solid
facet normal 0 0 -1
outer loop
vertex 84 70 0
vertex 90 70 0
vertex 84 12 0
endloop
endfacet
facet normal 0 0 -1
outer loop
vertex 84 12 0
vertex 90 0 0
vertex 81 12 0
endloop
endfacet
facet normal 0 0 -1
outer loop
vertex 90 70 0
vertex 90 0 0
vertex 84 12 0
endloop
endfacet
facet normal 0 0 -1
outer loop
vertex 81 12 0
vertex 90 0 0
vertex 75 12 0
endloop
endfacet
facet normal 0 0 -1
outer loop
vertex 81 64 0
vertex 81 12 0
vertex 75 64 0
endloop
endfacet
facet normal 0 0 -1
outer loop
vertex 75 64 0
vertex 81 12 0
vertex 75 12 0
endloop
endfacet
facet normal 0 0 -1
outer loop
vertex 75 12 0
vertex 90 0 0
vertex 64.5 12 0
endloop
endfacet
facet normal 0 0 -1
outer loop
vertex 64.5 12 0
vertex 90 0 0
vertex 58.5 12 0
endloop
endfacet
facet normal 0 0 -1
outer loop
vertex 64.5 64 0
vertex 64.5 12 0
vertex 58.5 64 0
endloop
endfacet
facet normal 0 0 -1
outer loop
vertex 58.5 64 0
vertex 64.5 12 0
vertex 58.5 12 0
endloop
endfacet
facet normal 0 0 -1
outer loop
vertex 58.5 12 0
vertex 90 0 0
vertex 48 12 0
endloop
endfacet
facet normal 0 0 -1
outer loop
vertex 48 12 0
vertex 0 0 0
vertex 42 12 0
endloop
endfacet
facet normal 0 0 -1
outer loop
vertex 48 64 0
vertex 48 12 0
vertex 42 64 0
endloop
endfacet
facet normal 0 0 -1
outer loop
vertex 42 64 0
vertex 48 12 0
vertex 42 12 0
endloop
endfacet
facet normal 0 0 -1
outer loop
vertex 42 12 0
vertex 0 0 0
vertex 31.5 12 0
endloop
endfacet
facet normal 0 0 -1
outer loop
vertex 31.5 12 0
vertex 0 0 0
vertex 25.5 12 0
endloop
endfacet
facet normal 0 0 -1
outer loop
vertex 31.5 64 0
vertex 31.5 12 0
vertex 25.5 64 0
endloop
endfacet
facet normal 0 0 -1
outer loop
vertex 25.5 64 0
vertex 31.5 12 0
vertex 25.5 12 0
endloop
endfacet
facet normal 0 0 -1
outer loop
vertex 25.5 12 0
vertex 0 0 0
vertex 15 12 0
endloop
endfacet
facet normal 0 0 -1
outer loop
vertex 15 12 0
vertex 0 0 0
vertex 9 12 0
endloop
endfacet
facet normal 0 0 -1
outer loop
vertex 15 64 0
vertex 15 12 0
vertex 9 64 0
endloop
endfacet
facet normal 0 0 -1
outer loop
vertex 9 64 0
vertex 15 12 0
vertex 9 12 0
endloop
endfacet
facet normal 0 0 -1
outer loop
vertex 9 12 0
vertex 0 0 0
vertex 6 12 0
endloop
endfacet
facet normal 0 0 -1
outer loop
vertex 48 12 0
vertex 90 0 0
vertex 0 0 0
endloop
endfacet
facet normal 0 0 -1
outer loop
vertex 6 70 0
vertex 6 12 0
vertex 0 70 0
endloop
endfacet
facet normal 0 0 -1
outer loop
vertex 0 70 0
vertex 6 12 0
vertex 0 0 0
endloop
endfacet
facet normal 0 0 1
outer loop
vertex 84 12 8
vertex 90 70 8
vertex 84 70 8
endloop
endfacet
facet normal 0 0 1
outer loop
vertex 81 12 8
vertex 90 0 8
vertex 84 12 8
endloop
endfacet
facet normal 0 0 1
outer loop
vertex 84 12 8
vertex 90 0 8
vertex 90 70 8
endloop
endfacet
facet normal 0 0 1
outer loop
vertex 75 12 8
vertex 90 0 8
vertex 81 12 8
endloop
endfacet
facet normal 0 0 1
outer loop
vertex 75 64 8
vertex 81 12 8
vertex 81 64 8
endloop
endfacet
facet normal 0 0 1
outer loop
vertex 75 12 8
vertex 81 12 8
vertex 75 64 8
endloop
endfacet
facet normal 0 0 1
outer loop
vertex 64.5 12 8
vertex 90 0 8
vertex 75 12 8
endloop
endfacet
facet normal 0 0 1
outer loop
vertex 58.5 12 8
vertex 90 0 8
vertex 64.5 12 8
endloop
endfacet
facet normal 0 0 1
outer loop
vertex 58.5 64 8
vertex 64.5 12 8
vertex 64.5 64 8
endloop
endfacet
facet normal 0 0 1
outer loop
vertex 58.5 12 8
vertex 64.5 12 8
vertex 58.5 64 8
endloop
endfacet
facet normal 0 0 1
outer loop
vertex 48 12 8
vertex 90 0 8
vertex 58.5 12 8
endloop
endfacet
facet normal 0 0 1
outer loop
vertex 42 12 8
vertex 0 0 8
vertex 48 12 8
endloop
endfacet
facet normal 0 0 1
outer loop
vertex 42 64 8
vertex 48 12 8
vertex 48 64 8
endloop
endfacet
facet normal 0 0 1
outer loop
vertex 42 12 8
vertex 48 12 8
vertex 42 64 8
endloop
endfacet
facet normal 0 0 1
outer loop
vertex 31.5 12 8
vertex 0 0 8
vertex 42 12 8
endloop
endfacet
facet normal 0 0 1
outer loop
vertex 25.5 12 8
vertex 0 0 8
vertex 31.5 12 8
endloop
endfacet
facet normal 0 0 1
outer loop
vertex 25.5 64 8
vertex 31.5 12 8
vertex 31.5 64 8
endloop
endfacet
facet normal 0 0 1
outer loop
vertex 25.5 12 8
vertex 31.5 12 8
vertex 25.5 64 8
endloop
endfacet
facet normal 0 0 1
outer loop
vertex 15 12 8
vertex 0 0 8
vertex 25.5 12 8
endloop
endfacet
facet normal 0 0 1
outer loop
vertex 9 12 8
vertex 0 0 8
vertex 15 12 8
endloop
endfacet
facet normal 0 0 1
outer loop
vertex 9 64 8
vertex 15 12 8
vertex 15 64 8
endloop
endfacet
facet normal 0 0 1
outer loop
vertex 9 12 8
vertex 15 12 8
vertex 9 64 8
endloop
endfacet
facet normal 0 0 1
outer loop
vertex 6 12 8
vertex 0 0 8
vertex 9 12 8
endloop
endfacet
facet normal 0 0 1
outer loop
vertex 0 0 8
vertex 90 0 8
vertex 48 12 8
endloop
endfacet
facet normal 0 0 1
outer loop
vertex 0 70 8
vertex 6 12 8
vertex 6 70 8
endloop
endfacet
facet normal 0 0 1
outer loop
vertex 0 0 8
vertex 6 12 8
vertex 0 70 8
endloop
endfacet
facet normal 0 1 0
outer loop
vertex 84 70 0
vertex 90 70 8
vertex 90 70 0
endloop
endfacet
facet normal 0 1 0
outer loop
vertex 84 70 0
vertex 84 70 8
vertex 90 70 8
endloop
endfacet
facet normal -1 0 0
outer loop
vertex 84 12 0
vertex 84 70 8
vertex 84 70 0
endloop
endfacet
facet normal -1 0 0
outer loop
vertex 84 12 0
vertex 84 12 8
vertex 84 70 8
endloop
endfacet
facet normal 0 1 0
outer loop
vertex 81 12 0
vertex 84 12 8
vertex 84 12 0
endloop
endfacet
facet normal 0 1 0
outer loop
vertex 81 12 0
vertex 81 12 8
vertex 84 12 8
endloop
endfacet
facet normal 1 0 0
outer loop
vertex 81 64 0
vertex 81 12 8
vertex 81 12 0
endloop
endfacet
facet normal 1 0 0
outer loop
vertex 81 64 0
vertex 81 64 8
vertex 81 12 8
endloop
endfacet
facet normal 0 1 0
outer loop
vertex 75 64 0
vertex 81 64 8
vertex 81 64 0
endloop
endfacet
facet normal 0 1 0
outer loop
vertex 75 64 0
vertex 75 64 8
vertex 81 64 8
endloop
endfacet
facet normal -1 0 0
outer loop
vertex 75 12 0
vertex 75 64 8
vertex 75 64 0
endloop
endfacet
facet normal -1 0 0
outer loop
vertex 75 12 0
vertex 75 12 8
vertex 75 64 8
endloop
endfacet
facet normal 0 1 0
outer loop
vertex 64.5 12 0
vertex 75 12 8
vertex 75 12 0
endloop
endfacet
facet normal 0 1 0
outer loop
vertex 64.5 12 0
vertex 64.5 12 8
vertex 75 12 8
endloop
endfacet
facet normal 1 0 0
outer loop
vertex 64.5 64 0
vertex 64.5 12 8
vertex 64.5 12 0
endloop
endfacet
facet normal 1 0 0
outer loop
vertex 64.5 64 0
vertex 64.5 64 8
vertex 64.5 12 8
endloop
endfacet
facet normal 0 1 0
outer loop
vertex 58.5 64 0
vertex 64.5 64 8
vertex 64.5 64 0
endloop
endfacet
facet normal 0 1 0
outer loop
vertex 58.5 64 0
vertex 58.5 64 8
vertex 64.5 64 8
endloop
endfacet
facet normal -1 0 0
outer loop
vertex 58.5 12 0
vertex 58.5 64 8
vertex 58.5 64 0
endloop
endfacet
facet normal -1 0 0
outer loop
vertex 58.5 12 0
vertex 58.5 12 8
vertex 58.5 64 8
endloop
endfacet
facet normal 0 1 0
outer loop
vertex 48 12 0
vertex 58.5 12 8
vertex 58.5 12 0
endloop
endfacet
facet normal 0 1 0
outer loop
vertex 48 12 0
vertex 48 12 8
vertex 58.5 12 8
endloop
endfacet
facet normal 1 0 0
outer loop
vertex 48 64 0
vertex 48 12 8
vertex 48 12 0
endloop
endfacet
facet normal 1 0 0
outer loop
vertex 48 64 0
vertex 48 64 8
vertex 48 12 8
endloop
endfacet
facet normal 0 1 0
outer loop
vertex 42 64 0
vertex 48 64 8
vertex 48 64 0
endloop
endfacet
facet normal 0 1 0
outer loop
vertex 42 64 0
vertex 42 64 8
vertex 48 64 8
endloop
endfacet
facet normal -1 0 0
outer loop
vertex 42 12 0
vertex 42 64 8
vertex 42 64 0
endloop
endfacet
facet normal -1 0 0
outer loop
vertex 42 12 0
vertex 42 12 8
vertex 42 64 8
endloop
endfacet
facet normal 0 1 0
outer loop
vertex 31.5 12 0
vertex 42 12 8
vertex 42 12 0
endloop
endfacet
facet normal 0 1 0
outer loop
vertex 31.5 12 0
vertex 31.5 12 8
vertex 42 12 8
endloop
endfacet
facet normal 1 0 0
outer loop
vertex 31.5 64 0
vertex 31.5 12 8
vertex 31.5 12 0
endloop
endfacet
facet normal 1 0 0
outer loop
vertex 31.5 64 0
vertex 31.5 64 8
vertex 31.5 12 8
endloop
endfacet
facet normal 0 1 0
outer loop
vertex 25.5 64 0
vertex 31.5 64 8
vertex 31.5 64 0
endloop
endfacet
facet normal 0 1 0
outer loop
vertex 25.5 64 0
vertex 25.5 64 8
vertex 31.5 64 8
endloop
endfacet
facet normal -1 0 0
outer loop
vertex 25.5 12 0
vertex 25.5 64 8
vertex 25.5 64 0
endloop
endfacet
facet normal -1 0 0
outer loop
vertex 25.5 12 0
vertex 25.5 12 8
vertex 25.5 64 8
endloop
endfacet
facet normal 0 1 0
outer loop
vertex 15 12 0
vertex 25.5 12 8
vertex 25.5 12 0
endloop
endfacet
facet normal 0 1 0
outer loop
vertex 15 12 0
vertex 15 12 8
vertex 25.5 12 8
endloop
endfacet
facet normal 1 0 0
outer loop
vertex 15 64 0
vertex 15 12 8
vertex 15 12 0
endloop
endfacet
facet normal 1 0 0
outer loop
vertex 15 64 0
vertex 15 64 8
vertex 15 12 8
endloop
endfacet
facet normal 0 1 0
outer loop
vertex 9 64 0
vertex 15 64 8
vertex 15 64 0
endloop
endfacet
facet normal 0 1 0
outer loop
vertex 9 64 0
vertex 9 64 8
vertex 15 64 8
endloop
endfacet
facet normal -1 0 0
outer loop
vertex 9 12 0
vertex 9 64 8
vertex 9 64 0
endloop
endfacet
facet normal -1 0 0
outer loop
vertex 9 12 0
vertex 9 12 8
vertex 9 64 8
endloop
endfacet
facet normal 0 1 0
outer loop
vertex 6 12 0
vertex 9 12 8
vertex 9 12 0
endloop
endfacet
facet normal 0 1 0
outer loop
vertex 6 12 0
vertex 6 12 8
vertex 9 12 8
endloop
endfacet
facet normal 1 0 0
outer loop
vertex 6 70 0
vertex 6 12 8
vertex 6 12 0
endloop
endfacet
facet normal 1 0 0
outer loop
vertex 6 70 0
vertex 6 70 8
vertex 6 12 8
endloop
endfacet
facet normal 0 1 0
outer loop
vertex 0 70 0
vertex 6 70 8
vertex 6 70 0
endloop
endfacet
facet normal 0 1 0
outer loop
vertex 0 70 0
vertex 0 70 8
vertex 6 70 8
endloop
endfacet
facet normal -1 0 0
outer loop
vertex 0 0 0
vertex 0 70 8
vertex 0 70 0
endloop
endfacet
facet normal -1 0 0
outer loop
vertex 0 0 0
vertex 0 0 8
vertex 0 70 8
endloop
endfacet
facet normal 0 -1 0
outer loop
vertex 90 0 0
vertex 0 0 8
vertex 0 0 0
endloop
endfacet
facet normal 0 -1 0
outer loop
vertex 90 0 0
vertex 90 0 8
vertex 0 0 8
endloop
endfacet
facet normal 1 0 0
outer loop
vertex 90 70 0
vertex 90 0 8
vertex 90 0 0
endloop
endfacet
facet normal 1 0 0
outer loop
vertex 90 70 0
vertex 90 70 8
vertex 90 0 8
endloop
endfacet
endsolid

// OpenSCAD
$fn = 32;

// ----------------------------------------------------------------------
// Guard grille: 5 slats over a 90 x 70 mm plate
// ----------------------------------------------------------------------

// --- parameters (mm) ---
profile_height = 8;       // extrusion height
profile_points = 28;      // points of the closed outline

profile = [[0, 0], [90, 0], [90, 70], [84, 70], [84, 12], [81, 12], [81, 64], [75, 64], [75, 12], [64.5, 12], [64.5, 64], [58.5, 64], [58.5, 12], [48, 12], [48, 64], [42, 64], [42, 12], [31.5, 12], [31.5, 64], [25.5, 64], [25.5, 12], [15, 12], [15, 64], [9, 64], [9, 12], [6, 12], [6, 70], [0, 70]];  // single closed polygon, 28 points, counter clockwise

// --- the one profile operation ---
linear_extrude(height = profile_height) polygon(points = profile);
